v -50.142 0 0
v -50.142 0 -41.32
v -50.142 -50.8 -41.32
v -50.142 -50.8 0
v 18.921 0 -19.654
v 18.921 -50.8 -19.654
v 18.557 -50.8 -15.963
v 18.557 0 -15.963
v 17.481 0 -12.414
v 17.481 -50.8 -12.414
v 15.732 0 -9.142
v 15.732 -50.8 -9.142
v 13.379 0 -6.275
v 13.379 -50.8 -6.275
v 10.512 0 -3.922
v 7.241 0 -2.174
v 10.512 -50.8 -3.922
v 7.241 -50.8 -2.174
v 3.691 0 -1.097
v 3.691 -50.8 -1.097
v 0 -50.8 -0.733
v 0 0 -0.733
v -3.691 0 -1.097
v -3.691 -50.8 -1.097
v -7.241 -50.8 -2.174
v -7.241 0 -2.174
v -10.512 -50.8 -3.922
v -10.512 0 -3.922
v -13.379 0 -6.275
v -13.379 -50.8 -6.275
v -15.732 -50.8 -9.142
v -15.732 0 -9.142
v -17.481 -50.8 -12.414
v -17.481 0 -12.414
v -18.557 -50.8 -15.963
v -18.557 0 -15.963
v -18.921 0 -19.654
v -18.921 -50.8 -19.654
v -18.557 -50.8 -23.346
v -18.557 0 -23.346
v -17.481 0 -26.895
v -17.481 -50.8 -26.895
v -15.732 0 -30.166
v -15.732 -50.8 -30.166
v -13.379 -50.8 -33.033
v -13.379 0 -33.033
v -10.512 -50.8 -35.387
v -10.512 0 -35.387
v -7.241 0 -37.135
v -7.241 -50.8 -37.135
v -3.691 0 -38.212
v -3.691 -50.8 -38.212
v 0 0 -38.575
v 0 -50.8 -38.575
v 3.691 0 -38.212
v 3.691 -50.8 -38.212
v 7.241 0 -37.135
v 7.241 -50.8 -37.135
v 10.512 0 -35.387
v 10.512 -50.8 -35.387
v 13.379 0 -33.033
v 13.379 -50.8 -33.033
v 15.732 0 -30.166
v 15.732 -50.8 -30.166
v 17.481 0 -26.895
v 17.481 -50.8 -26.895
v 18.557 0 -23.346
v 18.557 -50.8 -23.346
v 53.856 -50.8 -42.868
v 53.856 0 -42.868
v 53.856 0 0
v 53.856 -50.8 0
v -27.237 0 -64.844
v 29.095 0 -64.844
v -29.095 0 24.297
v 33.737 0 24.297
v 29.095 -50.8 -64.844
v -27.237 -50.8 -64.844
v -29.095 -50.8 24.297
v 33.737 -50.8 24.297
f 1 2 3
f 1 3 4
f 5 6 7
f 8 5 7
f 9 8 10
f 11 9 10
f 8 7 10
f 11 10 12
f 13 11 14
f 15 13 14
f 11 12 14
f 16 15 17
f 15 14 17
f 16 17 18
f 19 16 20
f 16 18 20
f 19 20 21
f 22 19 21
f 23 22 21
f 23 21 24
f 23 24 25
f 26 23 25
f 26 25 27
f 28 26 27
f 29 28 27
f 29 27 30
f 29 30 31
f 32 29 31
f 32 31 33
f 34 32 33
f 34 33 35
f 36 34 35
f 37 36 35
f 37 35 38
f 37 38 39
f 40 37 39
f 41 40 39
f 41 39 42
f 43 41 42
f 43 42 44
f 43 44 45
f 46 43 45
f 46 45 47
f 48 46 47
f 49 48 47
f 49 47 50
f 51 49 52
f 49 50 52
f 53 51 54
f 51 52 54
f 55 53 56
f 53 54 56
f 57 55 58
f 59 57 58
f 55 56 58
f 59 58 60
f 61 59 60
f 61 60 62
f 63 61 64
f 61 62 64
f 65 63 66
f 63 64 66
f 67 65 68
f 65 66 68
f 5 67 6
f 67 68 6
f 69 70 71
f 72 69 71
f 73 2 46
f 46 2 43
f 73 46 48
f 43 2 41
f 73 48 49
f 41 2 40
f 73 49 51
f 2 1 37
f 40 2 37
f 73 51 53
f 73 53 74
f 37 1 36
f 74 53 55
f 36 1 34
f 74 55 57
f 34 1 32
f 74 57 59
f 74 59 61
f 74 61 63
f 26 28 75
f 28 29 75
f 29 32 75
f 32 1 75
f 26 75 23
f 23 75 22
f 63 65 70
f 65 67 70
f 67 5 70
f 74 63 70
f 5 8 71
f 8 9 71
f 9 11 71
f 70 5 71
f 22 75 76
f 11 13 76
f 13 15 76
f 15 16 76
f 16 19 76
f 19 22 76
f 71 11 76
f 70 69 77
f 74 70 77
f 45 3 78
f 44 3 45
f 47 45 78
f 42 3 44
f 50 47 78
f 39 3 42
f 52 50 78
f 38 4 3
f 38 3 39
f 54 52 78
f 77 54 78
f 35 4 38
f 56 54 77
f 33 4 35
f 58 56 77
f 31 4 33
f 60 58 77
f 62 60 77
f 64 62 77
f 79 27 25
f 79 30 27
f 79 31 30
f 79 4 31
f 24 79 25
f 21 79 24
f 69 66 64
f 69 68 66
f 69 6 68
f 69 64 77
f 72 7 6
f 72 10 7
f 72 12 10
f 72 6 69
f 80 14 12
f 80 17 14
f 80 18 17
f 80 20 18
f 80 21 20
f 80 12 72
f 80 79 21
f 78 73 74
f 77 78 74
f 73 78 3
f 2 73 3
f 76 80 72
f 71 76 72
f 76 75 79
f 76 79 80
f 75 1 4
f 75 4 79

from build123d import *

# Parameters (mm, degrees)
F0_W     = 103.9975248277
F0_H     = 89.1407411546
F1_DEPTH = 50.8
F2_R     = 18.9210521973
F3_DEPTH = 50.801
F5_DEPTH = 50.801


with BuildPart() as f1:
    # F0 (on Front) → F1 (new body)
    with BuildSketch(Plane.XZ):
        with Locations((1.8570963293, -20.2733287588)):
            Rectangle(F0_W, F0_H)
    extrude(amount=F1_DEPTH)

    # F2 (on face) → F3 (cut, through all)
    with BuildSketch(Plane.XZ.offset(50.8)):
        with Locations((0, -19.6542944759)):
            Circle(F2_R)
    extrude(amount=-F3_DEPTH, mode=Mode.SUBTRACT)

    # F4 (on face) → F5 (cut, through all)
    with BuildSketch(Plane.XZ.offset(50.8)):
        Polygon((-50.1416660845, 24.2970418185), (-50.1416660845, 0), (-29.0945451707, 24.2970418185), align=None)
        Polygon((53.8558587432, 24.2970418185), (33.7372943759, 24.2970418185), (53.8558587432, 0), align=None)
        Polygon((-27.2374469787, -64.8436993361), (-50.1416660845, -41.3204431534), (-50.1416660845, -64.8436993361), align=None)
        Polygon((53.8558587432, -42.8680256009), (29.094548896, -64.8436993361), (53.8558587432, -64.8436993361), align=None)
    extrude(amount=-F5_DEPTH, mode=Mode.SUBTRACT)


solid = f1.part
